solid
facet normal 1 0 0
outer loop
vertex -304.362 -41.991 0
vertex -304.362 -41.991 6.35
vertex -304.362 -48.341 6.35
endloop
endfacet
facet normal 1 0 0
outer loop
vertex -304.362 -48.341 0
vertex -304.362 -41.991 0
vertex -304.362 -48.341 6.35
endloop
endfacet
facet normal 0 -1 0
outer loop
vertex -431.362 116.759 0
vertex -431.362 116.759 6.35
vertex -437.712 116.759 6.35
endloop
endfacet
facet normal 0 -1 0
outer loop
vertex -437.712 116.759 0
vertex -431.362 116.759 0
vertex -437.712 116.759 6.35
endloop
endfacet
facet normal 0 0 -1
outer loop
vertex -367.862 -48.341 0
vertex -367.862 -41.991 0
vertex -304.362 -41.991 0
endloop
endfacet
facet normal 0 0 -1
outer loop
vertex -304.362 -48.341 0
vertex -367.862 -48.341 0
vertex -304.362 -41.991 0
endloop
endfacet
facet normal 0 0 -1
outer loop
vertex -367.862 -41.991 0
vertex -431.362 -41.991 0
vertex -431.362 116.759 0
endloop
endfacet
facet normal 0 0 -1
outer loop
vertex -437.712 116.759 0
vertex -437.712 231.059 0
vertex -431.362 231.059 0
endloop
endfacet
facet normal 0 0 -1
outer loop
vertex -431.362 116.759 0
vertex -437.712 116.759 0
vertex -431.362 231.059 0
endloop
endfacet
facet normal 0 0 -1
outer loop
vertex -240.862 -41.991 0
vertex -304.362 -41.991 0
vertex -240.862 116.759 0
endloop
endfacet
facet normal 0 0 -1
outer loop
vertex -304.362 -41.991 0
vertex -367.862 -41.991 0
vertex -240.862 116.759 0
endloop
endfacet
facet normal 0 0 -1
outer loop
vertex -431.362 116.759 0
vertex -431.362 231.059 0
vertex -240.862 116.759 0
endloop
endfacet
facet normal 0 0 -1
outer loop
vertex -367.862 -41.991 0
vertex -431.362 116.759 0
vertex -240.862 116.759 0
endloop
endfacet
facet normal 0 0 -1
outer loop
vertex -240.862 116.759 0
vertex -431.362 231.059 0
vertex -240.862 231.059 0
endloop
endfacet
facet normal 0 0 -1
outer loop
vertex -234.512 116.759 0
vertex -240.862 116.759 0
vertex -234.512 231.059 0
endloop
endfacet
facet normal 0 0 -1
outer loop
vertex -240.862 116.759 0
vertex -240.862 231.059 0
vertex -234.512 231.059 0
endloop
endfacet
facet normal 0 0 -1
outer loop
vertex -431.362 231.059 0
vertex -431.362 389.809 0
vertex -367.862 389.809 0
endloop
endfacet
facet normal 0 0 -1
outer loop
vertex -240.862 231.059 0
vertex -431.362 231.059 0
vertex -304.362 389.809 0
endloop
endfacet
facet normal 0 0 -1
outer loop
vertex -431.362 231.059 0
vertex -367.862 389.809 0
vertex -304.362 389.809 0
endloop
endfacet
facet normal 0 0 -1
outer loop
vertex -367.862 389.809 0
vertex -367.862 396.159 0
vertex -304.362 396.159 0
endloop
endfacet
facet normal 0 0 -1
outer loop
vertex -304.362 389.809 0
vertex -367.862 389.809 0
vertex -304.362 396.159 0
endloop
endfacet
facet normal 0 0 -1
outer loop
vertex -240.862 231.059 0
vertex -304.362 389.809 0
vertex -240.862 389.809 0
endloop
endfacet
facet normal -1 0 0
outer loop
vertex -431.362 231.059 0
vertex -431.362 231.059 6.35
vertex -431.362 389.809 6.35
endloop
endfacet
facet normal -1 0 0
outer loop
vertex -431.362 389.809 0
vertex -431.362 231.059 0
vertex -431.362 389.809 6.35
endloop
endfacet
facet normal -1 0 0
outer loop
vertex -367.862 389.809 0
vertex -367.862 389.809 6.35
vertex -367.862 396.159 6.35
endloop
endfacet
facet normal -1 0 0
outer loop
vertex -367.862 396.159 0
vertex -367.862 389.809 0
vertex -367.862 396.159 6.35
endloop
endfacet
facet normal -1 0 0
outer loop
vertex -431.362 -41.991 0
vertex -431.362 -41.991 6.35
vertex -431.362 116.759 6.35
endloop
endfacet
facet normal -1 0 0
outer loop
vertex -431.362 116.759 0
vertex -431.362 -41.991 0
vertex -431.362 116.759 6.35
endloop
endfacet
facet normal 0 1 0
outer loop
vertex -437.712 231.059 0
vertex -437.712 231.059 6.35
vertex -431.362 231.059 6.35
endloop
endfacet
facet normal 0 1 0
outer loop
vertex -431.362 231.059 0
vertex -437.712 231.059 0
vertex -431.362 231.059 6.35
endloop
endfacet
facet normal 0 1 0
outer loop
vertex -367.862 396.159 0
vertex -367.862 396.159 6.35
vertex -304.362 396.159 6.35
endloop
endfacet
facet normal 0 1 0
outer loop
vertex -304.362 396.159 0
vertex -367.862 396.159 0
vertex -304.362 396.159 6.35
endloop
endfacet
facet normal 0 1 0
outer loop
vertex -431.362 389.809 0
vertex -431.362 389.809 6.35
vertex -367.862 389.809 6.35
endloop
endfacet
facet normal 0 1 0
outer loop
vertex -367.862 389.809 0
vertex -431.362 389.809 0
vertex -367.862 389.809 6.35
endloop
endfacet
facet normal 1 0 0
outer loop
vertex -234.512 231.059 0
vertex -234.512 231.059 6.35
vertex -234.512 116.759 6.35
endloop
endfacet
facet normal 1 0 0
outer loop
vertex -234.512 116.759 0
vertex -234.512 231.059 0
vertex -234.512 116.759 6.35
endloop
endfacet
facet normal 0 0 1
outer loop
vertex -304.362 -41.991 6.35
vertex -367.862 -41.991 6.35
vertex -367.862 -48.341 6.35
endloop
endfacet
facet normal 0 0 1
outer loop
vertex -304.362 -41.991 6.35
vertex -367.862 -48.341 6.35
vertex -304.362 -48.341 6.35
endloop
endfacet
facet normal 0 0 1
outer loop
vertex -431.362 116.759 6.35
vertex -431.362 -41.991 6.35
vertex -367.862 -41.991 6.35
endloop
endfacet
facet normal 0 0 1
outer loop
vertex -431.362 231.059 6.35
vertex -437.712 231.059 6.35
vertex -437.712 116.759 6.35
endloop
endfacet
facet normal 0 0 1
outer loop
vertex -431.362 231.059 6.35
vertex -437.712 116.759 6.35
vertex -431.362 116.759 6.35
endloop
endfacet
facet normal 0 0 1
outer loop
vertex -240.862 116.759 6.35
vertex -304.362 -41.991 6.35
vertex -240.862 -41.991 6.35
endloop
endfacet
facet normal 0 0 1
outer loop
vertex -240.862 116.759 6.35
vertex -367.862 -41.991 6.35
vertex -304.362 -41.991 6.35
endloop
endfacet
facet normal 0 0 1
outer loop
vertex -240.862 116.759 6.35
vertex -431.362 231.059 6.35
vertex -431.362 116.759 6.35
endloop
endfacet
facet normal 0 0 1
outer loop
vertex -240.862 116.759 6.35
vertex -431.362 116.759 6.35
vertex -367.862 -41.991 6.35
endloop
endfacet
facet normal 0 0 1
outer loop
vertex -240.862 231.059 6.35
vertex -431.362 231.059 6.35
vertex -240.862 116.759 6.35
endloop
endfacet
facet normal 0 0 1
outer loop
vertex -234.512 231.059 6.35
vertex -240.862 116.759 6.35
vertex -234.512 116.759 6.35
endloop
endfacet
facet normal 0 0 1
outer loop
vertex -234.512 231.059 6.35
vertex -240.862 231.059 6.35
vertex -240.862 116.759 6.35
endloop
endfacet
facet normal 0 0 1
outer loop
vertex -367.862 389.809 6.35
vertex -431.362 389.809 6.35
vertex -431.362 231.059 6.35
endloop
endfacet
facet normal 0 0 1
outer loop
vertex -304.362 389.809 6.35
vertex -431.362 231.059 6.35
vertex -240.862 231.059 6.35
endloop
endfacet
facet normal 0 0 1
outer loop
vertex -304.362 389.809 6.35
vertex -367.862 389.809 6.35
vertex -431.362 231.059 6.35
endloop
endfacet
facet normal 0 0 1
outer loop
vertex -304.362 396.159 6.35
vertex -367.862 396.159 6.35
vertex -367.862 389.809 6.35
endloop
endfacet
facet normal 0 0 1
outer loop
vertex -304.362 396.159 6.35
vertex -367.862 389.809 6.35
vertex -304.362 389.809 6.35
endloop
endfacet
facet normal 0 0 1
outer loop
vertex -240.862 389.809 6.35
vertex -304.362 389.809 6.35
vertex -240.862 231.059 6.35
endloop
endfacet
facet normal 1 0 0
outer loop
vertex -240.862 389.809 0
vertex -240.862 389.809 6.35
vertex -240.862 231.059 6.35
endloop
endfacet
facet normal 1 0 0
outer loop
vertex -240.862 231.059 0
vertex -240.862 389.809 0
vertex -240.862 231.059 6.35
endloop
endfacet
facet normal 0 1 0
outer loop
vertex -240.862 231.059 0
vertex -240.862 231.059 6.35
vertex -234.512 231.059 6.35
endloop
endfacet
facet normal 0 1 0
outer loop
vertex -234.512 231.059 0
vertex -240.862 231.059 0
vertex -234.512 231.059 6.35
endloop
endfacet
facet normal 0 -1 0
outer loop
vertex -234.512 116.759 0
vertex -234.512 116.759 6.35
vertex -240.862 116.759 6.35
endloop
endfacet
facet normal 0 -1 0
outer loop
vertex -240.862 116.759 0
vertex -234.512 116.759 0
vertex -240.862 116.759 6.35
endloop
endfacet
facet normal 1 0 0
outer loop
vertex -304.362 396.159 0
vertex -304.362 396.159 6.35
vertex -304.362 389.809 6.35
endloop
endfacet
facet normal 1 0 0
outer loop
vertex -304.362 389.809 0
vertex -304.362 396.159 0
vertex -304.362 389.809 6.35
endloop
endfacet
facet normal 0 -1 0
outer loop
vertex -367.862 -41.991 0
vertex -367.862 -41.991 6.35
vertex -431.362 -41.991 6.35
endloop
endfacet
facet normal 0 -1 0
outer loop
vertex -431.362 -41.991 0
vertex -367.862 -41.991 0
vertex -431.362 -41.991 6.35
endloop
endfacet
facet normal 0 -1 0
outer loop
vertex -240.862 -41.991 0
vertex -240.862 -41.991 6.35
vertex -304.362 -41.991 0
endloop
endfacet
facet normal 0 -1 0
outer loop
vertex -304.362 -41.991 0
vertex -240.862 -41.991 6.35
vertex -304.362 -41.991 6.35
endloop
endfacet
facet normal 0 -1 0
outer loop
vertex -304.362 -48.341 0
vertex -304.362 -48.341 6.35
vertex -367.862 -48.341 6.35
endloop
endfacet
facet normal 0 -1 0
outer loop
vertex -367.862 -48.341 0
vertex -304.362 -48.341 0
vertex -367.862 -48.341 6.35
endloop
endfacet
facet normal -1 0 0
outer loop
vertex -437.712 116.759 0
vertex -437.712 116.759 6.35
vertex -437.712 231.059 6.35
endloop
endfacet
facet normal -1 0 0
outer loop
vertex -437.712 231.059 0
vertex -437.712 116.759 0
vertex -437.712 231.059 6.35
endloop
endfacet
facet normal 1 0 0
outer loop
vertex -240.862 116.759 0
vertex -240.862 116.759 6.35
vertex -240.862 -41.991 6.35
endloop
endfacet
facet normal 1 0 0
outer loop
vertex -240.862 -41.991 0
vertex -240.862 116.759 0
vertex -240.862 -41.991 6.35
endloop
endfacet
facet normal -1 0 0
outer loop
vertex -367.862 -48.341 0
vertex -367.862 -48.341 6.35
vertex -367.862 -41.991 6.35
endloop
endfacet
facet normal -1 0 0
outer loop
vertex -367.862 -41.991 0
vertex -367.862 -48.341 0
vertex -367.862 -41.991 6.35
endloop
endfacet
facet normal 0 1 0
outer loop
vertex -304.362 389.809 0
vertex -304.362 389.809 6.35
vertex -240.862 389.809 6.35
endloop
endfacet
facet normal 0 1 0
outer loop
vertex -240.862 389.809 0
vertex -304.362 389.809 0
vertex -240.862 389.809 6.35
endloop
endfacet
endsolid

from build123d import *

# Parameters (mm, degrees)
SKETCH1_W                = 215.9
SKETCH1_H                = 457.2
BOSS_EXTRUDE1_DEPTH      = 6.35
CUT_EXTRUDE1_DEPTH       = 1
CUT_EXTRUDE1_DEPTH_BACK  = 7.35
CUT_EXTRUDE2_DEPTH       = 1
CUT_EXTRUDE2_DEPTH_BACK  = 7.35
CUT_EXTRUDE3_DEPTH       = 1
CUT_EXTRUDE3_DEPTH_BACK  = 7.35
CUT_EXTRUDE4_DEPTH       = 1
CUT_EXTRUDE4_DEPTH_BACK  = 7.35
CUT_EXTRUDE6_DEPTH       = 1
CUT_EXTRUDE6_DEPTH_BACK  = 7.35
CUT_EXTRUDE7_DEPTH       = 1
CUT_EXTRUDE7_DEPTH_BACK  = 7.35
CUT_EXTRUDE9_DEPTH       = 1
CUT_EXTRUDE9_DEPTH_BACK  = 7.35
CUT_EXTRUDE12_DEPTH      = 1
CUT_EXTRUDE12_DEPTH_BACK = 7.35
CUT_EXTRUDE13_DEPTH      = 7.35
CUT_EXTRUDE14_DEPTH      = 1
CUT_EXTRUDE14_DEPTH_BACK = 7.35
CUT_EXTRUDE15_DEPTH      = 1
CUT_EXTRUDE15_DEPTH_BACK = 7.35
CUT_EXTRUDE16_DEPTH      = 1
CUT_EXTRUDE16_DEPTH_BACK = 7.35


with BuildPart() as part:
    # Sketch1 → Boss-Extrude1 (new body)
    with BuildSketch(Plane.XY):
        with Locations((-336.112358352, 173.908620123)):
            Rectangle(SKETCH1_W, SKETCH1_H)
    extrude(amount=BOSS_EXTRUDE1_DEPTH)

    # Sketch3 → Cut-Extrude1 (cut, two sides)
    with BuildSketch(Plane.XY.offset(6.35)) as cut_extrude1_sk:
        Polygon((-1442.380242436, -41.991379877), (-444.062358352, -41.991379877), (-367.862358352, -41.991379877), (-367.862358352, -54.691379877), (-367.862358352, -1053.009263961), (-1736.075705676, -2507.15733996), (-2810.59358976, -1496.139455876), align=None)
    extrude(amount=CUT_EXTRUDE1_DEPTH, mode=Mode.SUBTRACT)
    extrude(cut_extrude1_sk.sketch, amount=-CUT_EXTRUDE1_DEPTH_BACK, mode=Mode.SUBTRACT)

    # Sketch4 → Cut-Extrude2 (cut, two sides)
    with BuildSketch(Plane.XY.offset(6.35)) as cut_extrude2_sk:
        Polygon((770.155525732, -41.991379877), (-228.162358352, -41.991379877), (-304.362358352, -41.991379877), (-304.362358352, -54.691379877), (-304.362358352, -1053.009263961), (1063.850988971, -2507.15733996), (2138.368873055, -1496.139455876), align=None)
    extrude(amount=CUT_EXTRUDE2_DEPTH, mode=Mode.SUBTRACT)
    extrude(cut_extrude2_sk.sketch, amount=-CUT_EXTRUDE2_DEPTH_BACK, mode=Mode.SUBTRACT)

    # Sketch5 → Cut-Extrude3 (cut, two sides)
    with BuildSketch(Plane.XY.offset(6.35)) as cut_extrude3_sk:
        Polygon((-1321.857723807, -48.341379877), (-367.862358352, -48.341379877), (-304.362358352, -48.341379877), (649.633007102, -48.341379877), (649.633007102, -1956.332110786), (-1321.857723807, -1956.332110786), align=None)
    extrude(amount=CUT_EXTRUDE3_DEPTH, mode=Mode.SUBTRACT)
    extrude(cut_extrude3_sk.sketch, amount=-CUT_EXTRUDE3_DEPTH_BACK, mode=Mode.SUBTRACT)

    # Sketch6 → Cut-Extrude4 (cut, two sides)
    with BuildSketch(Plane.XY.offset(6.35)) as cut_extrude4_sk:
        Polygon((-1430.972246725, 389.808620123), (-444.062358352, 389.808620123), (-367.862358352, 389.808620123), (-367.862358352, 402.508620123), (-367.862358352, 1389.418508496), (-1719.957069161, 2827.404740722), (-2783.066957534, 1827.79485235), align=None)
    extrude(amount=CUT_EXTRUDE4_DEPTH, mode=Mode.SUBTRACT)
    extrude(cut_extrude4_sk.sketch, amount=-CUT_EXTRUDE4_DEPTH_BACK, mode=Mode.SUBTRACT)

    # Sketch7 → Cut-Extrude6 (cut, two sides)
    with BuildSketch(Plane.XY.offset(6.35)) as cut_extrude6_sk:
        Polygon((758.74753002, 389.808620123), (-228.162358352, 389.808620123), (-304.362358352, 389.808620123), (-304.362358352, 402.508620123), (-304.362358352, 1389.418508496), (1047.732352456, 2827.404740722), (2110.842240829, 1827.79485235), align=None)
    extrude(amount=CUT_EXTRUDE6_DEPTH, mode=Mode.SUBTRACT)
    extrude(cut_extrude6_sk.sketch, amount=-CUT_EXTRUDE6_DEPTH_BACK, mode=Mode.SUBTRACT)

    # Sketch8 → Cut-Extrude7 (cut, two sides)
    with BuildSketch(Plane.XY.offset(6.35)) as cut_extrude7_sk:
        Polygon((637.509607102, 396.158620123), (-304.362358352, 396.158620123), (-367.862358352, 396.158620123), (-1309.734323807, 396.158620123), (-1309.734323807, 2279.902551032), (637.509607102, 2279.902551032), align=None)
    extrude(amount=CUT_EXTRUDE7_DEPTH, mode=Mode.SUBTRACT)
    extrude(cut_extrude7_sk.sketch, amount=-CUT_EXTRUDE7_DEPTH_BACK, mode=Mode.SUBTRACT)

    # Sketch9 → Cut-Extrude9 (cut, two sides)
    with BuildSketch(Plane.XY.offset(6.35)) as cut_extrude9_sk:
        Polygon((-240.862358352, -1017.943060863), (-240.862358352, -41.991379877), (-240.862358352, 116.758620123), (-228.162358352, 116.758620123), (747.789322634, 116.758620123), (2219.450453951, -1165.481704095), (1230.798772964, -2300.183385081), align=None)
    extrude(amount=CUT_EXTRUDE9_DEPTH, mode=Mode.SUBTRACT)
    extrude(cut_extrude9_sk.sketch, amount=-CUT_EXTRUDE9_DEPTH_BACK, mode=Mode.SUBTRACT)

    # Sketch10 → Cut-Extrude12 (cut, two sides)
    with BuildSketch(Plane.XY.offset(6.35)) as cut_extrude12_sk:
        Polygon((-240.862358352, 1365.760301109), (-240.862358352, 389.808620123), (-240.862358352, 231.058620123), (-228.162358352, 231.058620123), (747.789322634, 231.058620123), (2219.450453951, 1513.298944341), (1230.798772964, 2648.000625327), align=None)
    extrude(amount=CUT_EXTRUDE12_DEPTH, mode=Mode.SUBTRACT)
    extrude(cut_extrude12_sk.sketch, amount=-CUT_EXTRUDE12_DEPTH_BACK, mode=Mode.SUBTRACT)

    # Sketch12 → Cut-Extrude13 (cut, through all)
    with BuildSketch(Plane.XY.offset(6.35)):
        Polygon((-234.512358352, 939.558620123), (-234.512358352, 231.058620123), (-234.512358352, 116.758620123), (-234.512358352, -591.741379877), (1182.487641648, -591.741379877), (1182.487641648, 939.558620123), align=None)
    extrude(amount=-CUT_EXTRUDE13_DEPTH, mode=Mode.SUBTRACT)

    # Sketch13 → Cut-Extrude14 (cut, two sides)
    with BuildSketch(Plane.XY.offset(6.35)) as cut_extrude14_sk:
        Polygon((-431.362358352, -1012.66894285), (-431.362358352, -41.991379877), (-431.362358352, 116.758620123), (-444.062358352, 116.758620123), (-1414.739921325, 116.758620123), (-2878.883865855, -1158.052046108), (-1895.506302882, -2287.479609081), align=None)
    extrude(amount=CUT_EXTRUDE14_DEPTH, mode=Mode.SUBTRACT)
    extrude(cut_extrude14_sk.sketch, amount=-CUT_EXTRUDE14_DEPTH_BACK, mode=Mode.SUBTRACT)

    # Sketch14 → Cut-Extrude15 (cut, two sides)
    with BuildSketch(Plane.XY.offset(6.35)) as cut_extrude15_sk:
        Polygon((-431.362358352, 1360.486183096), (-431.362358352, 389.808620123), (-431.362358352, 231.058620123), (-444.062358352, 231.058620123), (-1414.739921325, 231.058620123), (-2878.883865855, 1505.869286354), (-1895.506302882, 2635.296849327), align=None)
    extrude(amount=CUT_EXTRUDE15_DEPTH, mode=Mode.SUBTRACT)
    extrude(cut_extrude15_sk.sketch, amount=-CUT_EXTRUDE15_DEPTH_BACK, mode=Mode.SUBTRACT)

    # Sketch16 → Cut-Extrude16 (cut, two sides)
    with BuildSketch(Plane.XY.offset(6.35)) as cut_extrude16_sk:
        Polygon((-437.712358352, 932.013321967), (-437.712358352, 231.058620123), (-437.712358352, 116.758620123), (-437.712358352, -584.196081721), (-1839.62176204, -584.196081721), (-1839.62176204, 932.013321967), align=None)
    extrude(amount=CUT_EXTRUDE16_DEPTH, mode=Mode.SUBTRACT)
    extrude(cut_extrude16_sk.sketch, amount=-CUT_EXTRUDE16_DEPTH_BACK, mode=Mode.SUBTRACT)


solid = part.part
